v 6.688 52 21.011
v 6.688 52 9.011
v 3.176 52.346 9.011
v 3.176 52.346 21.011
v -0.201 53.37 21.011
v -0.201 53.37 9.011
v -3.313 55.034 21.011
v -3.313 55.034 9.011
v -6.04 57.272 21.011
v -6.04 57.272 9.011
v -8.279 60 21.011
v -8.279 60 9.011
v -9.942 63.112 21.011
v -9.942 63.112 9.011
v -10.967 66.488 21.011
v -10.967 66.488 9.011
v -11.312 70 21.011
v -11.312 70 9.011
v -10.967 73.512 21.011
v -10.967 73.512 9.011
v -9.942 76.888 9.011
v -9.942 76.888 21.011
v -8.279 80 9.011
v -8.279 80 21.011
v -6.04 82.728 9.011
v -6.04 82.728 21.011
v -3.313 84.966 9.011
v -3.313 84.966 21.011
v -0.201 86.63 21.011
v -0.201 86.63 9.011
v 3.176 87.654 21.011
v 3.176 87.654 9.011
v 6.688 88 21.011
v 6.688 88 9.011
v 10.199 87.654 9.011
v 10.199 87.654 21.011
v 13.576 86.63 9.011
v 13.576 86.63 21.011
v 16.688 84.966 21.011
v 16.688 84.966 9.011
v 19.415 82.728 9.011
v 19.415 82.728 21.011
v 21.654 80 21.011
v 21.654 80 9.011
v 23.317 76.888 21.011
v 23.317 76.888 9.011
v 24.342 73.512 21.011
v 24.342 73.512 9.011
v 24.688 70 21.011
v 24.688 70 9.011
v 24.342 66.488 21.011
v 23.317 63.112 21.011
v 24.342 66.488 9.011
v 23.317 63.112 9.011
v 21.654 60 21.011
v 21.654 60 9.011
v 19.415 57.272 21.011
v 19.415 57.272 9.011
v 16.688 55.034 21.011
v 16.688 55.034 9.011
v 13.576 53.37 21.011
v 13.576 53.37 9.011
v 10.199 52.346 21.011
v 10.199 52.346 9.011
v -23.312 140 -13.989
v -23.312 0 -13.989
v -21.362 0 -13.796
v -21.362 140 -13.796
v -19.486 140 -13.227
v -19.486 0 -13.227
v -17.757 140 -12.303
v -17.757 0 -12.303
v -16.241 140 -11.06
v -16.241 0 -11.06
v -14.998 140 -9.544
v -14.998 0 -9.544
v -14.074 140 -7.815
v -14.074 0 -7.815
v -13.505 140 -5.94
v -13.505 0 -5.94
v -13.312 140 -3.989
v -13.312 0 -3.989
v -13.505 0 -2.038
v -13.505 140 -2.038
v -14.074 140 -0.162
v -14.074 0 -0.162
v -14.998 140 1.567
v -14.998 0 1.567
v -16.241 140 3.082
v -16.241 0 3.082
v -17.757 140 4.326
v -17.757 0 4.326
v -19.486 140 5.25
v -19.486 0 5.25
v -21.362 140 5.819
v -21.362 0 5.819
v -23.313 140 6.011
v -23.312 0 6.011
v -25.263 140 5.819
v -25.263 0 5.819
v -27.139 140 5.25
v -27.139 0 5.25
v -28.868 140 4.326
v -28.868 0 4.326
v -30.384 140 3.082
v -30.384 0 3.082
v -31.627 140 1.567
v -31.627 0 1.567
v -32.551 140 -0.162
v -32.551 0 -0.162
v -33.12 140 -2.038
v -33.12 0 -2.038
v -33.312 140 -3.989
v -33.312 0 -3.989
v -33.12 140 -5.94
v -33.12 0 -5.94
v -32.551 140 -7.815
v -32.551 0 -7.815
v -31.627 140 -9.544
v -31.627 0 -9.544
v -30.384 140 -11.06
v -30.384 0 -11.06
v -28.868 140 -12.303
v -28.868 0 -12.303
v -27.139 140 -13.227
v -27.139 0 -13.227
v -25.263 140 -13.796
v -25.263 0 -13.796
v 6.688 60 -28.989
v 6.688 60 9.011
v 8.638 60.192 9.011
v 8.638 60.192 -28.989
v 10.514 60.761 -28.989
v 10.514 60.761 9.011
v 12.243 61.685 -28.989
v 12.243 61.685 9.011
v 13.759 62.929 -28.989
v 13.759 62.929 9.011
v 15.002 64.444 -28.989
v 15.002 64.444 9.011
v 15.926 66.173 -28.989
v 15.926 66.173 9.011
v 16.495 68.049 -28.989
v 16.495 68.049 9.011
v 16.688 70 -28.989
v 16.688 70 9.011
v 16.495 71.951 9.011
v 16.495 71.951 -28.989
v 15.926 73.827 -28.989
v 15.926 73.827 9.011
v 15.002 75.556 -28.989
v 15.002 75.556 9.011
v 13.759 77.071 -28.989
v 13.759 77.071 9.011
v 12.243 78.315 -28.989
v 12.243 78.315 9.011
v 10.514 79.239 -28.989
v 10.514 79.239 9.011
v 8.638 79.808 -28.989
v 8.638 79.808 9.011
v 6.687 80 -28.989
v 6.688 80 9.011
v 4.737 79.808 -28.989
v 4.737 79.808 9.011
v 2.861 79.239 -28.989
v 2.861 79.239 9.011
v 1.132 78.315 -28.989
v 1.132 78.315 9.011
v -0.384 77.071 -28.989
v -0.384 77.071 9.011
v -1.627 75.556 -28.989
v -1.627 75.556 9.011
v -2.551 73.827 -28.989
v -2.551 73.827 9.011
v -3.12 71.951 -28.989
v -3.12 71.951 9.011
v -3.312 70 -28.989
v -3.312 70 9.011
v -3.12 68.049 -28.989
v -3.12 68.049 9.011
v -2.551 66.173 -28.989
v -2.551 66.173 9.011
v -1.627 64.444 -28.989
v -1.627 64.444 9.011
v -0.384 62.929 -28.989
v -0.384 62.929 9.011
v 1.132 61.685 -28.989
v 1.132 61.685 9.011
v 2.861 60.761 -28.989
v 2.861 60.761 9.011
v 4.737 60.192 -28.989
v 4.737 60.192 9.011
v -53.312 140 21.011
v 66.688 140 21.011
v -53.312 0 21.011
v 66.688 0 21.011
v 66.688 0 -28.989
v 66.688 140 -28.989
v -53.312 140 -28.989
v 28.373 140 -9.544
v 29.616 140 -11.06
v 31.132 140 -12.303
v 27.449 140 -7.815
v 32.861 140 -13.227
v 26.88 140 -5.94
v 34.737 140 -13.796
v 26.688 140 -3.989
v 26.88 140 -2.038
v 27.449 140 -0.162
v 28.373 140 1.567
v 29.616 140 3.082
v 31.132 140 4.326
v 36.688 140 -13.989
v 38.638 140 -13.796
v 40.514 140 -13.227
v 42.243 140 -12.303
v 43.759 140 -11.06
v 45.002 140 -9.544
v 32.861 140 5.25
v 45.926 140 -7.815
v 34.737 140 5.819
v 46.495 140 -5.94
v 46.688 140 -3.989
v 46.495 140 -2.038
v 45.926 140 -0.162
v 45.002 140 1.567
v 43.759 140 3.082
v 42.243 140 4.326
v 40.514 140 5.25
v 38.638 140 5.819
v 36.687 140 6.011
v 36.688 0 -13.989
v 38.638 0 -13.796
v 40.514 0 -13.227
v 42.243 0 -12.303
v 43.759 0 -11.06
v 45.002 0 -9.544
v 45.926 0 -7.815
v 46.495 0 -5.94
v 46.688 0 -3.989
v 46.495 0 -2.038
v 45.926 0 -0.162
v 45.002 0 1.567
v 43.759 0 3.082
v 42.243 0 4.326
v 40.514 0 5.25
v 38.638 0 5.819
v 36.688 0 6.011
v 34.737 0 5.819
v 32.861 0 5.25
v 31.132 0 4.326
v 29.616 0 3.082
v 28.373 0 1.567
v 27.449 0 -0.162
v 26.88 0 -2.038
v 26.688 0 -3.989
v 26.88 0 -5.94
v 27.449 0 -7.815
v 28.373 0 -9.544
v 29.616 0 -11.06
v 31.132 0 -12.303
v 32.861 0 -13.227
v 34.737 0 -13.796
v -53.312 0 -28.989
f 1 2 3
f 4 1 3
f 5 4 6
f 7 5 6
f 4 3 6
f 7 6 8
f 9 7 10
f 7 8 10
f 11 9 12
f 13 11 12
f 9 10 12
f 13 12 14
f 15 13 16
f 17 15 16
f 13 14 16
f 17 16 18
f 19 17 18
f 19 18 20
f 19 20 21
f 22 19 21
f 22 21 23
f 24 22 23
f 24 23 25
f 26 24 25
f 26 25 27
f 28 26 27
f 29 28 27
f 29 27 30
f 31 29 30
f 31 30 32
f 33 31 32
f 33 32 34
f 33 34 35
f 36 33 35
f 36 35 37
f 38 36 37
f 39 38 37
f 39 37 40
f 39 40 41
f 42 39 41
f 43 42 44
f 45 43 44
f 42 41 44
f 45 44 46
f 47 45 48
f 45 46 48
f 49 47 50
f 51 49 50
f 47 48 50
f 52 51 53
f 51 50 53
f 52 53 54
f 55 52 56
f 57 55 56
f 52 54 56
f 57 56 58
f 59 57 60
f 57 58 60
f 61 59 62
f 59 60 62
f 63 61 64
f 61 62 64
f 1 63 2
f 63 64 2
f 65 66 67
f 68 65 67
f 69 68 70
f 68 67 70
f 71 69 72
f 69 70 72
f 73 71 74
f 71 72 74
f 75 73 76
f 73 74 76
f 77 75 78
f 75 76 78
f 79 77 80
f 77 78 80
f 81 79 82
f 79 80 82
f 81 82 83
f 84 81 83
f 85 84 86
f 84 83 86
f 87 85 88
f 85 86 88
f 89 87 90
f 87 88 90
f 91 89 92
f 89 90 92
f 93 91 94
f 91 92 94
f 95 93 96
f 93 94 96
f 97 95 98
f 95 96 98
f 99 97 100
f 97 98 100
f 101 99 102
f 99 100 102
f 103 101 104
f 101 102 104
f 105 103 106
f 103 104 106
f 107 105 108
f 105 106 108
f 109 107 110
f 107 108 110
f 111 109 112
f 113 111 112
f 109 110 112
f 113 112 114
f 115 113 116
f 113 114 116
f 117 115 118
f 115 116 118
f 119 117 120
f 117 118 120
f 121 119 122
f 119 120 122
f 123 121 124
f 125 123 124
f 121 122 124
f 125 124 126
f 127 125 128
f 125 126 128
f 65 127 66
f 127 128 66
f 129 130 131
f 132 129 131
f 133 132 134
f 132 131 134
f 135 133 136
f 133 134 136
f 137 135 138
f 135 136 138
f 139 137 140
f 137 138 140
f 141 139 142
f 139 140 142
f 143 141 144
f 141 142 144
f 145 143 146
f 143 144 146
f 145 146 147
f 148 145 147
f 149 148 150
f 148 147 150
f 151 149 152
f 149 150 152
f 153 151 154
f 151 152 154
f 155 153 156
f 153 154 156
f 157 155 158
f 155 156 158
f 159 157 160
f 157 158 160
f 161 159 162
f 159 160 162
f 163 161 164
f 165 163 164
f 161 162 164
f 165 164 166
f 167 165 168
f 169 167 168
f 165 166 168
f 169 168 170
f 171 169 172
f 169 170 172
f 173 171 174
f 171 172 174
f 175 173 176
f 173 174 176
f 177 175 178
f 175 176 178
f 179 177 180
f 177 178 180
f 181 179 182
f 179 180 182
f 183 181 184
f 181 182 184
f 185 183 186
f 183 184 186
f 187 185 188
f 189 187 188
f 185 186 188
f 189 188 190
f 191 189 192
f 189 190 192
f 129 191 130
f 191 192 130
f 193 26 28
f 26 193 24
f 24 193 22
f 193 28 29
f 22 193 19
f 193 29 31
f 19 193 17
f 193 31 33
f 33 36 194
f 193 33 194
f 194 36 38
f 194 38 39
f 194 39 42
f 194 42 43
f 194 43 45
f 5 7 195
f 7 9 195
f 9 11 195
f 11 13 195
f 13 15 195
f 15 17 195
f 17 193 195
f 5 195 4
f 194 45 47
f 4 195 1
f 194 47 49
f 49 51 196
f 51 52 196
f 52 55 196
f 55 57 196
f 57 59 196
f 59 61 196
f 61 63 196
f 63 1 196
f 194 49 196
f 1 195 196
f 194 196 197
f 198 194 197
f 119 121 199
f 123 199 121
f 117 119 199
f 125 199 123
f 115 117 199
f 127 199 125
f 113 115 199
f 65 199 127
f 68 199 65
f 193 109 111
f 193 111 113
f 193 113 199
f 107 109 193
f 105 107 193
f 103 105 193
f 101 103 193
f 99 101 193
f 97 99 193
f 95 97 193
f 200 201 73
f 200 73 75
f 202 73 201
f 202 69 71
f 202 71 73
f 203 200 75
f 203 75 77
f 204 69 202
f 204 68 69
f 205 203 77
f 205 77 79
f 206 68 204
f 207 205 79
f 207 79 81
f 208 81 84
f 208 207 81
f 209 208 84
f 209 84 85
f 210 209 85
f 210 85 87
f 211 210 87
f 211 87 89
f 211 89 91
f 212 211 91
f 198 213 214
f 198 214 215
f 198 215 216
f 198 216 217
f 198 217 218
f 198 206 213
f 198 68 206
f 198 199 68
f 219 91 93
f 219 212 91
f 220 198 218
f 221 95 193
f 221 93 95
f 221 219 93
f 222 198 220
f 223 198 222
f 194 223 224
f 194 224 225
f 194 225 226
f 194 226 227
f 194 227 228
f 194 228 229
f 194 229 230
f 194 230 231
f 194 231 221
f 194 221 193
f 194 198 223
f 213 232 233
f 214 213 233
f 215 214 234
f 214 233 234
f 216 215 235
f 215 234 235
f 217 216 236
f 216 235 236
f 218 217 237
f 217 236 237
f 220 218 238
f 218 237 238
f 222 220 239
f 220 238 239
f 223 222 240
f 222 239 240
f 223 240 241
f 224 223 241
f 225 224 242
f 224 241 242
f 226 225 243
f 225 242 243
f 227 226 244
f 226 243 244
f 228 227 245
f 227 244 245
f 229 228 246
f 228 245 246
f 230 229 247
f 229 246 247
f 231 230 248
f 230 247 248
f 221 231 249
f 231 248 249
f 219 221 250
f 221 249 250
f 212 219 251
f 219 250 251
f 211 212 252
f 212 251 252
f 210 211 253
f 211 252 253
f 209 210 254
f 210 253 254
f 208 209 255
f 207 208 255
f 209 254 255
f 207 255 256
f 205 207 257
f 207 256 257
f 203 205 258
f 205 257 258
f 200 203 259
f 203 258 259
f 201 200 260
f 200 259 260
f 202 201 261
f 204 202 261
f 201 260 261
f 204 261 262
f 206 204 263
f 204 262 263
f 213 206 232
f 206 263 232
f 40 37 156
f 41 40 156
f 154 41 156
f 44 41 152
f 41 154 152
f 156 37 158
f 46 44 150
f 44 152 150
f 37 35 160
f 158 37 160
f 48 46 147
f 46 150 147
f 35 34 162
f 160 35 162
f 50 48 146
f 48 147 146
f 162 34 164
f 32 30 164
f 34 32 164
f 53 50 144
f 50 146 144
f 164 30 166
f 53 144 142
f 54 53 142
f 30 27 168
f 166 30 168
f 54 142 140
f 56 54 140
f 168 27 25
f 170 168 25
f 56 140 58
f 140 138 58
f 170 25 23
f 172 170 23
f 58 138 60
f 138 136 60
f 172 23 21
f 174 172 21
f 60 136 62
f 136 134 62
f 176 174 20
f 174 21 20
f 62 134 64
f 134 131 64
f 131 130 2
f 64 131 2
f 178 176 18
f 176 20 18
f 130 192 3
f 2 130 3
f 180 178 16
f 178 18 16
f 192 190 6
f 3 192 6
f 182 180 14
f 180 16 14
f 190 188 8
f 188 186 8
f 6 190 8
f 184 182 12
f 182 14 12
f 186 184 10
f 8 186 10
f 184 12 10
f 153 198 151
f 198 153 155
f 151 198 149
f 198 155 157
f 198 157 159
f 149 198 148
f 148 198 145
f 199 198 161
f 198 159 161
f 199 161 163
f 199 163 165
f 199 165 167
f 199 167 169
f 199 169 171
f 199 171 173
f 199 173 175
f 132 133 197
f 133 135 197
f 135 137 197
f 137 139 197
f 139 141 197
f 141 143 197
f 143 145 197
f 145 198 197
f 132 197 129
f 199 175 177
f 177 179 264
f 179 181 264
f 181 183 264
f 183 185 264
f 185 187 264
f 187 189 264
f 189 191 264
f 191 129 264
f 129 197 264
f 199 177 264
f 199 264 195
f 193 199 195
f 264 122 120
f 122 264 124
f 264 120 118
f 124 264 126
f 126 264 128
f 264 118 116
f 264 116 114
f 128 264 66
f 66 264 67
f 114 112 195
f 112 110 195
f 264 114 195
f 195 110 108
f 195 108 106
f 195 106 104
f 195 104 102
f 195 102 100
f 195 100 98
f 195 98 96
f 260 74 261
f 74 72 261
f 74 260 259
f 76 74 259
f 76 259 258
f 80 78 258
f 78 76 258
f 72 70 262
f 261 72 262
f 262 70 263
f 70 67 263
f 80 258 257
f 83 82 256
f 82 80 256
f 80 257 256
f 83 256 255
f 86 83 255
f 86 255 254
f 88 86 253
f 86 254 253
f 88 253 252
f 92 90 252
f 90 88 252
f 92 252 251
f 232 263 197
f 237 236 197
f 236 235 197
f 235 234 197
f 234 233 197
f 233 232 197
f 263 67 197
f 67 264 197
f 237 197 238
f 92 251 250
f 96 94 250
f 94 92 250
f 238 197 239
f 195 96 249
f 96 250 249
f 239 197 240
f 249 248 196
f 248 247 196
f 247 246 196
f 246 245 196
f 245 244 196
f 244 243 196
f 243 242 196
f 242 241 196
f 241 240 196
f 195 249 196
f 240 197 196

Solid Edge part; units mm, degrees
sketch "Sketch1" plane through (0, 0, 0) normal (0, -1, 0) x (1, 0, 0)
  line L0 (-53.3125, 21.0114) -> (66.6875, 21.0114)
  line L1 (66.6875, 21.0114) -> (66.6875, -28.9886)
  line L2 (66.6875, -28.9886) -> (-53.3125, -28.9886)
  line L3 (-53.3125, -28.9886) -> (-53.3125, 21.0114)
extrude "Protrusion1" add sketch "Sketch1" against normal blind 140
hole "Hole1" at (36.6875, 0, -3.9886) direction (0, 1, 0) diameter 20 end up to next
hole "Hole_2" at (-23.3125, 0, -3.9886) direction (0, 1, 0) diameter 20 end up to next
hole "Hole_3" at (6.6875, 70, 21.0114) direction (0, 0, -1) diameter 20 end up to next counterbore diameter 36 counterbore depth 12
properties part number "C-3701" material "Steel"
